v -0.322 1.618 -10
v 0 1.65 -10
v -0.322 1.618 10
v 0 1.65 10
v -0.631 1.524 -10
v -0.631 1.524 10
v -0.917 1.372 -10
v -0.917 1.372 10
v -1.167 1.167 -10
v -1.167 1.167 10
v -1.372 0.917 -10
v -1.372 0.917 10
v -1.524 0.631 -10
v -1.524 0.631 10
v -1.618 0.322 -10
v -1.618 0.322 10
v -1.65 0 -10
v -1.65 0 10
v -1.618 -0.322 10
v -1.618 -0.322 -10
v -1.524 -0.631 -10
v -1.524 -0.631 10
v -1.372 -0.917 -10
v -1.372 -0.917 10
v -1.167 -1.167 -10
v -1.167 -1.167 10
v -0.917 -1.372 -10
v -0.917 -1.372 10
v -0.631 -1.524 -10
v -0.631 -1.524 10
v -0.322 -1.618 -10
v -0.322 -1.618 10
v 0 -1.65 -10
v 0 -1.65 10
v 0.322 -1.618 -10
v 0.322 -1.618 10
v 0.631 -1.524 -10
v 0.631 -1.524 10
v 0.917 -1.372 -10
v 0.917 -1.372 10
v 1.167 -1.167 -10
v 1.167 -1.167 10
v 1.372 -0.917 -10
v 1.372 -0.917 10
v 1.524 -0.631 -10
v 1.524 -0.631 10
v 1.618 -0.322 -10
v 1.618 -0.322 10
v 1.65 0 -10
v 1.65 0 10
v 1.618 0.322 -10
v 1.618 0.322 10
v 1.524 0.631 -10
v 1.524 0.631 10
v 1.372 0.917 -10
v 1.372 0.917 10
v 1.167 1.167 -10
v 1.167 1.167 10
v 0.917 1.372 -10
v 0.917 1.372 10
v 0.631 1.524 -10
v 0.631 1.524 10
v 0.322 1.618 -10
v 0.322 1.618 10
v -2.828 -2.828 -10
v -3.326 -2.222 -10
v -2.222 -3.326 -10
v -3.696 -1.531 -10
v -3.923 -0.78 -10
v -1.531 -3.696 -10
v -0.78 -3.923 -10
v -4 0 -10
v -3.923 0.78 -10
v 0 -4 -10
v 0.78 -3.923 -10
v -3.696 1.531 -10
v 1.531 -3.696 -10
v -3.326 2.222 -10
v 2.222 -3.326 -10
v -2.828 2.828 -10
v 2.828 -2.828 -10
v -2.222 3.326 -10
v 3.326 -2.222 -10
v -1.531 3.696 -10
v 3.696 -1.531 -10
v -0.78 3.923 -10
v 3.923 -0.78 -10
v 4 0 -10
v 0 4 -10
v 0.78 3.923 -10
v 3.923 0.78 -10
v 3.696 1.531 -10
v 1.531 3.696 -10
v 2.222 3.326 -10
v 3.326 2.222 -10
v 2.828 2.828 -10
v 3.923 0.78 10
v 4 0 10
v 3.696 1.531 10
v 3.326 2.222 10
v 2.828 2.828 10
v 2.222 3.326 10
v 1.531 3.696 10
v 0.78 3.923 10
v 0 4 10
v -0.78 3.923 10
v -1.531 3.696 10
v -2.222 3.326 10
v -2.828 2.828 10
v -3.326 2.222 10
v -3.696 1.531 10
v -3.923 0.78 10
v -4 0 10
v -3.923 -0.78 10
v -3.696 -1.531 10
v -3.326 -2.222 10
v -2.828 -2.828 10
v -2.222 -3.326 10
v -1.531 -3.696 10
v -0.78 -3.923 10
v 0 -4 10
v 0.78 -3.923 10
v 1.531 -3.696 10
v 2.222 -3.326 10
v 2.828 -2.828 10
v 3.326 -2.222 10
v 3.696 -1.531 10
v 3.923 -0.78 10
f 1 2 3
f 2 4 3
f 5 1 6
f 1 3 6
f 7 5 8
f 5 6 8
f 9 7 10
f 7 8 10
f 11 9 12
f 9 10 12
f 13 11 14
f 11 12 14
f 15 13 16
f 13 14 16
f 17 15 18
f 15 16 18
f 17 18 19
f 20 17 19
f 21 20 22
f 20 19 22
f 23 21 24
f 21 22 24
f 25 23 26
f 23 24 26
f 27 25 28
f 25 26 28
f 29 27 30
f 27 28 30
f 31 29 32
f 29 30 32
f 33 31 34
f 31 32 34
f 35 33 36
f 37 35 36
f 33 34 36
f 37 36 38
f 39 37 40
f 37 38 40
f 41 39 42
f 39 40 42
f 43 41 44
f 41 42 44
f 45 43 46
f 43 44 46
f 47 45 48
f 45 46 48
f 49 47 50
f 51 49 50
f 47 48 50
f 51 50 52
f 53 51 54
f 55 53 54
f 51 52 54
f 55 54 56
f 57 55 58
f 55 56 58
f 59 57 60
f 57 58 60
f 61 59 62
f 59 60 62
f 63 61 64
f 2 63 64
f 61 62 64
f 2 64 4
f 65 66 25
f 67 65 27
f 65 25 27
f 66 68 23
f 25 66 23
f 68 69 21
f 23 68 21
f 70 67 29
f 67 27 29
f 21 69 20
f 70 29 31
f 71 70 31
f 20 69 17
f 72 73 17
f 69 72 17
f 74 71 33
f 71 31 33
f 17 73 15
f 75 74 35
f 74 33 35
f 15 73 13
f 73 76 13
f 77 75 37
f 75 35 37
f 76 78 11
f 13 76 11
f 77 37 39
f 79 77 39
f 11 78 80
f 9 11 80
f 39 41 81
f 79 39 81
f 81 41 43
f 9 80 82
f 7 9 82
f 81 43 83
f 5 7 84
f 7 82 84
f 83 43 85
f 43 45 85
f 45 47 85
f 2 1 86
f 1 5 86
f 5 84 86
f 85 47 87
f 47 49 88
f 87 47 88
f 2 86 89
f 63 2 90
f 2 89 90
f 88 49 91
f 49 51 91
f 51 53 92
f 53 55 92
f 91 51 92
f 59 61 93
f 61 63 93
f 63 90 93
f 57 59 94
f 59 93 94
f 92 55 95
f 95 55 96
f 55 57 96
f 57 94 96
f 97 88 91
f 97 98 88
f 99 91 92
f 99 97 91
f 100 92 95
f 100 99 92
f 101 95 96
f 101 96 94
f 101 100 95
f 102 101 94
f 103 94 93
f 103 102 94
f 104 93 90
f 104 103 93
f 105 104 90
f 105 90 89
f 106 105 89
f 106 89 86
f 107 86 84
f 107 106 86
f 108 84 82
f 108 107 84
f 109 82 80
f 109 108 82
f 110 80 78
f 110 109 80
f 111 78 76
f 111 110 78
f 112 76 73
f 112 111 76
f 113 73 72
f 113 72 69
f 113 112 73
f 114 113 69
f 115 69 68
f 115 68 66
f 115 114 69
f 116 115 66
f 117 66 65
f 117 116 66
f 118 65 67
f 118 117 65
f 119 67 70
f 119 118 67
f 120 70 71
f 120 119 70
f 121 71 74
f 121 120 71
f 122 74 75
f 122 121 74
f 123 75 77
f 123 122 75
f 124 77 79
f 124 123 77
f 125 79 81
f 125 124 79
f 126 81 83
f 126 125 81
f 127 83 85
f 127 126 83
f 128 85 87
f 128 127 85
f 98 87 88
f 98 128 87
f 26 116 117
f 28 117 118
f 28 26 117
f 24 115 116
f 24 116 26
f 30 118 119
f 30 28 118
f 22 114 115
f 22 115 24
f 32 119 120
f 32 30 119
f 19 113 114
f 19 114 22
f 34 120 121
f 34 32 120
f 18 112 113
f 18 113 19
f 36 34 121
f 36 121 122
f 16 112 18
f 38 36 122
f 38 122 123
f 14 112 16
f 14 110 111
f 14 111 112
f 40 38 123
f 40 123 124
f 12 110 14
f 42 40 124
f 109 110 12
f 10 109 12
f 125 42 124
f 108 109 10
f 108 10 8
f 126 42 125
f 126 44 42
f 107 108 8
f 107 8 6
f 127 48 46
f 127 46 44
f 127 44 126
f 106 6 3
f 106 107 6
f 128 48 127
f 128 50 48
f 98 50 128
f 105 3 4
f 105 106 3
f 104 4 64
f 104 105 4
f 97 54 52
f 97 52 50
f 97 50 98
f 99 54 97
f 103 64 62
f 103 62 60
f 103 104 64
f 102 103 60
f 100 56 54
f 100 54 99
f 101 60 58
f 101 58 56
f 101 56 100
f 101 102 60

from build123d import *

# Parameters (mm, degrees)
SKETCH_1_R               = 4
SKETCH_1_R_2             = 1.25
EXTRUDE_1_DEPTH          = 10
M4X0_7_1_D               = 3.3
M4X0_7_1_DEPTH           = 11.5
M4X0_7_1_TIP             = 0.991420021
M4X0_7_1_ON_FACE_2_D     = 3.3
M4X0_7_1_ON_FACE_2_DEPTH = 11.5
M4X0_7_1_ON_FACE_2_TIP   = 0.991420021
M4X0_7_1_ON_FACE_3_D     = 3.3
M4X0_7_1_ON_FACE_3_DEPTH = 11.5
M4X0_7_1_ON_FACE_3_TIP   = 0.991420021


with BuildPart() as part:
    # ｽｹｯﾁ1 → ﾎﾞｽ - 押し出し1 (new body, symmetric)
    with BuildSketch(Plane.XY):
        Circle(SKETCH_1_R)
        Circle(SKETCH_1_R_2, mode=Mode.SUBTRACT)
        Circle(SKETCH_1_R_2)
    extrude(amount=EXTRUDE_1_DEPTH, both=True)

    # M4x0.7 ねじ穴1
    with Locations(Plane(origin=(0, 0, -10), x_dir=(0, -1, 0), z_dir=(0, 0, -1))):
        with Locations((0, 0)):
            Hole(M4X0_7_1_D / 2, depth=M4X0_7_1_DEPTH)
            with Locations((0, 0, -(M4X0_7_1_DEPTH + M4X0_7_1_TIP / 2))):  # 118° drill point
                Cone(0, M4X0_7_1_D / 2, M4X0_7_1_TIP, mode=Mode.SUBTRACT)

    # M4x0.7 ねじ穴1 on face 2
    with Locations(Plane(origin=(0, 0, 0), x_dir=(0, -1, 0), z_dir=(0, 0, -1))):
        with Locations((0, 0), (-3.399491027, 15.650266716), (-2.590821191, 13.66210105)):
            Hole(M4X0_7_1_ON_FACE_2_D / 2, depth=M4X0_7_1_ON_FACE_2_DEPTH)
            with Locations((0, 0, -(M4X0_7_1_ON_FACE_2_DEPTH + M4X0_7_1_ON_FACE_2_TIP / 2))):  # 118° drill point
                Cone(0, M4X0_7_1_ON_FACE_2_D / 2, M4X0_7_1_ON_FACE_2_TIP, mode=Mode.SUBTRACT)

    # M4x0.7 ねじ穴1 on face 3
    with Locations(Plane.XY.offset(10)):
        with Locations((0, 0)):
            Hole(M4X0_7_1_ON_FACE_3_D / 2, depth=M4X0_7_1_ON_FACE_3_DEPTH)
            with Locations((0, 0, -(M4X0_7_1_ON_FACE_3_DEPTH + M4X0_7_1_ON_FACE_3_TIP / 2))):  # 118° drill point
                Cone(0, M4X0_7_1_ON_FACE_3_D / 2, M4X0_7_1_ON_FACE_3_TIP, mode=Mode.SUBTRACT)


solid = part.part
